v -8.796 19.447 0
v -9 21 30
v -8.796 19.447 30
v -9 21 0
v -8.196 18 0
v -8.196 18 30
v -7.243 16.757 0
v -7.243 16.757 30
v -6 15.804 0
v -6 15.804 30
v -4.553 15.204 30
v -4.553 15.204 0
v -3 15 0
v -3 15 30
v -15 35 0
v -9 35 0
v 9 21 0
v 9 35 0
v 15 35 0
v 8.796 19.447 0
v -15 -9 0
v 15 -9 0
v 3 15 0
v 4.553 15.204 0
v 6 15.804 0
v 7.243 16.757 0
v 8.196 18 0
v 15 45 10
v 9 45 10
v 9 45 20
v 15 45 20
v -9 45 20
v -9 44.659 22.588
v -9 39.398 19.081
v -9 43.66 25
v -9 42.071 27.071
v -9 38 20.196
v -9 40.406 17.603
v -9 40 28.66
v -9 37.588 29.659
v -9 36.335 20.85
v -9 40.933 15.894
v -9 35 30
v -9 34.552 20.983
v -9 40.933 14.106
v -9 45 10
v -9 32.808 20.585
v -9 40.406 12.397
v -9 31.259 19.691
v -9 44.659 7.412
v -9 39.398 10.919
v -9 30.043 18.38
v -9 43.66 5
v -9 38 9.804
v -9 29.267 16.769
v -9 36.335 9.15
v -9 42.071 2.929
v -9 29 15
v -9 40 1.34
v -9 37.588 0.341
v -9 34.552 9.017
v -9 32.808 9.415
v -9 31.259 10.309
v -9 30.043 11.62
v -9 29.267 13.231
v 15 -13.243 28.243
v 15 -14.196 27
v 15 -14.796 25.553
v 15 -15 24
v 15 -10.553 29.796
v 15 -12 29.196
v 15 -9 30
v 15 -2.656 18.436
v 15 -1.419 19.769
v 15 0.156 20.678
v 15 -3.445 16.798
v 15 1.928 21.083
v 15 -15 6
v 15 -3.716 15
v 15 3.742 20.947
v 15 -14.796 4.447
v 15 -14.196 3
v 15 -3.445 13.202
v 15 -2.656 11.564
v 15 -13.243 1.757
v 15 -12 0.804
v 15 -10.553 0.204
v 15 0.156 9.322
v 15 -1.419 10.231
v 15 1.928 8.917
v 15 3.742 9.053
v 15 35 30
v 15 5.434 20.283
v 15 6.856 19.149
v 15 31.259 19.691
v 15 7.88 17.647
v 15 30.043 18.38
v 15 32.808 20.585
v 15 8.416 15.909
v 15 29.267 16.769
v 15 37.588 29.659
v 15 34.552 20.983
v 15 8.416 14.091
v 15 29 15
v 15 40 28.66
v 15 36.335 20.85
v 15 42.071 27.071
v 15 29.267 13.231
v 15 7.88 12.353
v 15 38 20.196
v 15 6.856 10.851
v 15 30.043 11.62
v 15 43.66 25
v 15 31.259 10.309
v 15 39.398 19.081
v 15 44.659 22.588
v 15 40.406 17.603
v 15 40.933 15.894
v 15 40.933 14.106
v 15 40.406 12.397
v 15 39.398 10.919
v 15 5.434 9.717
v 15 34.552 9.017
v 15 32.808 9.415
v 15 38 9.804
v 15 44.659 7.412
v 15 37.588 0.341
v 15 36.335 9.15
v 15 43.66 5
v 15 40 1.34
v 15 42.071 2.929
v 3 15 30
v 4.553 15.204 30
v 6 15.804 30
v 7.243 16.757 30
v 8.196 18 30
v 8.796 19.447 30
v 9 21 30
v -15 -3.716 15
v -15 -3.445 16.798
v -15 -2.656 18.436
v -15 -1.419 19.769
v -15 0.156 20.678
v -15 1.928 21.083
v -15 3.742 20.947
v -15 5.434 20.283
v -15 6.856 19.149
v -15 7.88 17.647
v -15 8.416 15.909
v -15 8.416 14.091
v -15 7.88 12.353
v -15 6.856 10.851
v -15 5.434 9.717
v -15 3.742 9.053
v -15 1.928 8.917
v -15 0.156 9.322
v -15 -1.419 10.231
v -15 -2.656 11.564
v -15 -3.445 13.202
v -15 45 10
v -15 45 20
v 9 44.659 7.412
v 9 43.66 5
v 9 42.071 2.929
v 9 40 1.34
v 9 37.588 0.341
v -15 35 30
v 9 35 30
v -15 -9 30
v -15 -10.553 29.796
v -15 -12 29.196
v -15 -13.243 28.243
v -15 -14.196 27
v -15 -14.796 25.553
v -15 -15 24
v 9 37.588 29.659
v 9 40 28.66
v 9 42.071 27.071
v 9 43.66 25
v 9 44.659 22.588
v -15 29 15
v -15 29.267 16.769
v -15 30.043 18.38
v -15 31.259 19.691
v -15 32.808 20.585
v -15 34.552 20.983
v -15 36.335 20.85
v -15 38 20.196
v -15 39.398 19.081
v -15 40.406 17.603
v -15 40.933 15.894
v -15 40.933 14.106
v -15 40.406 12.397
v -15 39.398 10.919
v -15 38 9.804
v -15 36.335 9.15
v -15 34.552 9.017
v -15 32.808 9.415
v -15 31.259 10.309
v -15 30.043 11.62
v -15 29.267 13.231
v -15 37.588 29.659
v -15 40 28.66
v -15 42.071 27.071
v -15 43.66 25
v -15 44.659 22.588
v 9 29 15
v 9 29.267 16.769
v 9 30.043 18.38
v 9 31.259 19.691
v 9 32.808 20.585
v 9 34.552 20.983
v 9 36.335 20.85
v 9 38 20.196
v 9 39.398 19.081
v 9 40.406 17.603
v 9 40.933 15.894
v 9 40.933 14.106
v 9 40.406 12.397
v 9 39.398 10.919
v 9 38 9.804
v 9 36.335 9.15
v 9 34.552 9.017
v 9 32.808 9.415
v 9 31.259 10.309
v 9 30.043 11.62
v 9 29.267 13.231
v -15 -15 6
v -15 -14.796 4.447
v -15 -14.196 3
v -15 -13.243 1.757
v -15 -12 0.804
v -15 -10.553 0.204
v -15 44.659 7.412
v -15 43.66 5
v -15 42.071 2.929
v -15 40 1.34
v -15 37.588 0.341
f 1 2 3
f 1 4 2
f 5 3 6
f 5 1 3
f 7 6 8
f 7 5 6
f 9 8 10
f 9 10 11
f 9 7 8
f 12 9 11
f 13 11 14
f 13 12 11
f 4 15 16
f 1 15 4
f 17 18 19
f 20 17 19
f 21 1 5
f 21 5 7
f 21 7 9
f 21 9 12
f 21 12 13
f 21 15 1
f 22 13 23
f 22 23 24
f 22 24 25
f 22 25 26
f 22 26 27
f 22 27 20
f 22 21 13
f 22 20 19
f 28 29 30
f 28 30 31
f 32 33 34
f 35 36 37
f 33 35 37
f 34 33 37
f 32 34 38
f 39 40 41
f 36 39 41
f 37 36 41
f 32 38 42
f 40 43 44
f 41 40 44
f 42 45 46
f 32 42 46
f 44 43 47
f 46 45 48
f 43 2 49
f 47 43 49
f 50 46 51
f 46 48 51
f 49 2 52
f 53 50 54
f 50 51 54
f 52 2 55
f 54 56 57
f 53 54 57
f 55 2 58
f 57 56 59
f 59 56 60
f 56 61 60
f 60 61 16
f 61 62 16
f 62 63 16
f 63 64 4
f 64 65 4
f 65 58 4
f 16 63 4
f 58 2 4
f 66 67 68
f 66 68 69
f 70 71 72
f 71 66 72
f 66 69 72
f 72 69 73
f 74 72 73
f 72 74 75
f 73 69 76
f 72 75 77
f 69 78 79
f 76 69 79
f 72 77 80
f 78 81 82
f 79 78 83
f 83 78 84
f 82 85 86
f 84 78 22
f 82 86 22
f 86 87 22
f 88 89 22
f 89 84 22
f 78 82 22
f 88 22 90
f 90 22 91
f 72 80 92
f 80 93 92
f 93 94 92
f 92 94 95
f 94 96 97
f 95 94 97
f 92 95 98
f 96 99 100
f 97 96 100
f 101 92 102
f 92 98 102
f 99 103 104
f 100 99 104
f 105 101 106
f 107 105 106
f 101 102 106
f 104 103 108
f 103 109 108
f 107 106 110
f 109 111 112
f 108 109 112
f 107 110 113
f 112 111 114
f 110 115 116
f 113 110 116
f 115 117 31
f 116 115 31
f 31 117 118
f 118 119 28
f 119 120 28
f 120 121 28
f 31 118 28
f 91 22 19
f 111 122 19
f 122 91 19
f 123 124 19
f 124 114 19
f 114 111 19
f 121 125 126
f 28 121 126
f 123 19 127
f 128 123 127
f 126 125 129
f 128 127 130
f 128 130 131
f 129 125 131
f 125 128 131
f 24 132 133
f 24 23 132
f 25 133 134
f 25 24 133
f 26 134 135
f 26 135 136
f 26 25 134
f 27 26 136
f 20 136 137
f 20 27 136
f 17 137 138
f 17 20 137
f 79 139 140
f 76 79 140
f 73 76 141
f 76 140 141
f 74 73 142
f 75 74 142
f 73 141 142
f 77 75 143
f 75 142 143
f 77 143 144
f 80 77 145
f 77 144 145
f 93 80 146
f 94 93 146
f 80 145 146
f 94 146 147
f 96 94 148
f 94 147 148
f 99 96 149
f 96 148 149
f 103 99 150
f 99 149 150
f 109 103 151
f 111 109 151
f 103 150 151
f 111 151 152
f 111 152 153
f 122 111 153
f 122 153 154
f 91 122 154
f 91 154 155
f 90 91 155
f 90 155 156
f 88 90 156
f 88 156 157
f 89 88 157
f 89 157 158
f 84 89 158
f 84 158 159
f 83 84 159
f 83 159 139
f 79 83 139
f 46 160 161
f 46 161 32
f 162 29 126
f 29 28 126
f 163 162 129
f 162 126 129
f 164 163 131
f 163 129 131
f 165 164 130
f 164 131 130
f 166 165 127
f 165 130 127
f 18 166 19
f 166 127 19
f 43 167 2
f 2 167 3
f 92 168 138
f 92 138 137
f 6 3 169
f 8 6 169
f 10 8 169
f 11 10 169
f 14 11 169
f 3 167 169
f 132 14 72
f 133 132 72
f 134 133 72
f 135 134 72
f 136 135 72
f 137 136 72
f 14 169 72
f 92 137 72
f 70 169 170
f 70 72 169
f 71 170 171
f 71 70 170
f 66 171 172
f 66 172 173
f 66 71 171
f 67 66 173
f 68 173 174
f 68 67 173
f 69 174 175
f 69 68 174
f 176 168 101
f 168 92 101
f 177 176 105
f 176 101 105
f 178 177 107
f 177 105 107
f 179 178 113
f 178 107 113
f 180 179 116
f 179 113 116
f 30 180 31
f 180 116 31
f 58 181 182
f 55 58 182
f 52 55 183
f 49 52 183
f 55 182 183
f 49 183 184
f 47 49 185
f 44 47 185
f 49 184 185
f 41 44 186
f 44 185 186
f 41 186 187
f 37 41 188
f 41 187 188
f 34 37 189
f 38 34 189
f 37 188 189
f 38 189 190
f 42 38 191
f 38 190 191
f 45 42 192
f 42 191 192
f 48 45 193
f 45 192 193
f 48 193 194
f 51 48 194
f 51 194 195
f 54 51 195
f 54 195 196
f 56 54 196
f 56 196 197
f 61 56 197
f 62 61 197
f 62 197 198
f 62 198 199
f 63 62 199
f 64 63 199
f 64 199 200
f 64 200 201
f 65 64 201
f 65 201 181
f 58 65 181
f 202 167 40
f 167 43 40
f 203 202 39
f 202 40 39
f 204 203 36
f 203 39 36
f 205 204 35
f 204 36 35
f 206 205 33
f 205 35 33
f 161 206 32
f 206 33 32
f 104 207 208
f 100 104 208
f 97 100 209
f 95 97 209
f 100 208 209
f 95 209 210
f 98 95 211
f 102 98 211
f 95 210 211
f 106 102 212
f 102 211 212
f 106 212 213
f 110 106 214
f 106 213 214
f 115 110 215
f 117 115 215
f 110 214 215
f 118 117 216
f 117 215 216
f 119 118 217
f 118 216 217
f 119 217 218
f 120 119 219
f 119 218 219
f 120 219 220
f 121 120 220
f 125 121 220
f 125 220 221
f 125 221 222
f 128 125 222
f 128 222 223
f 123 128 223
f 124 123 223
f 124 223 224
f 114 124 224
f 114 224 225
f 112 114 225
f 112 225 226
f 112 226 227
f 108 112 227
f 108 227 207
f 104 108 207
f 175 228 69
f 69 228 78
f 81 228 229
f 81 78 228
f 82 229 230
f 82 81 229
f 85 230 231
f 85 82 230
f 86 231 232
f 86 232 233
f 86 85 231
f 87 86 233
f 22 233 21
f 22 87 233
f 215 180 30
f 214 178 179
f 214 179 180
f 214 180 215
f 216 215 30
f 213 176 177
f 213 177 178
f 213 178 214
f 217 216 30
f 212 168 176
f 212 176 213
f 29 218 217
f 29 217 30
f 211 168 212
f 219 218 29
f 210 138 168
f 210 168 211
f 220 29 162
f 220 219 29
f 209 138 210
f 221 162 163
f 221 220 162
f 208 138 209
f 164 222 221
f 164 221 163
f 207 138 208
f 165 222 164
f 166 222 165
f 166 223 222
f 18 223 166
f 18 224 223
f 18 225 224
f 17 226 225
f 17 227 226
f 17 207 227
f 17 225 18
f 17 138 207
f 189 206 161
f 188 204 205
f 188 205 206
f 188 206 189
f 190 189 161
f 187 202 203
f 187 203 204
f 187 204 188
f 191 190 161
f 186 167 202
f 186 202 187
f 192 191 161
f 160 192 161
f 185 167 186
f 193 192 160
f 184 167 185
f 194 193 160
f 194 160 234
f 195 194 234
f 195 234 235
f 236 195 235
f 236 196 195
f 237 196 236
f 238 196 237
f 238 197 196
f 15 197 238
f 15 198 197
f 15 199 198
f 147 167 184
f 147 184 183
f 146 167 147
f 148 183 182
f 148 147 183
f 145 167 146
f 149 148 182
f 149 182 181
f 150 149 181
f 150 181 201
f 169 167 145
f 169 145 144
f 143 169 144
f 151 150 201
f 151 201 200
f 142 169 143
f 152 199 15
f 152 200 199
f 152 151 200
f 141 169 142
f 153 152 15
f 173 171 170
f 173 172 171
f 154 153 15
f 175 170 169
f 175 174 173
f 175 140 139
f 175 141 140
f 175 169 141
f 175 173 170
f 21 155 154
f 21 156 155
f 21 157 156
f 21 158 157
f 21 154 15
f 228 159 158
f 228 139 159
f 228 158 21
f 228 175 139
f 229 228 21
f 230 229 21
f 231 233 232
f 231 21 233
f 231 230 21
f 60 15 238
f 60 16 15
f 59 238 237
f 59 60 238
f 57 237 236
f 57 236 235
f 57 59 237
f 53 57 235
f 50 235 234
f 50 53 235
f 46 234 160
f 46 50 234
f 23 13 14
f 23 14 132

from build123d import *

# Parameters (mm, degrees)
SKETCH2_W           = 30
SKETCH2_H           = 30
BOSS_EXTRUDE2_DEPTH = 30
SKETCH4_W           = 6
SKETCH4_H           = 30
BOSS_EXTRUDE3_DEPTH = 30
FILLET4_R           = 10
SKETCH5_R           = 6
CUT_EXTRUDE1_DEPTH  = 30
FILLET5_R           = 6
SKETCH6_R           = 6.1
CUT_EXTRUDE2_DEPTH  = 62
FILLET6_R           = 6


with BuildPart() as part:
    # Sketch2 → Boss-Extrude2 (new body)
    with BuildSketch(Plane.XY):
        Rectangle(SKETCH2_W, SKETCH2_H)
    extrude(amount=BOSS_EXTRUDE2_DEPTH)

    # Sketch4 → Boss-Extrude3 (add)
    with BuildSketch(Plane(origin=(0, 15, 0), x_dir=(1, 0, 0), z_dir=(0, 1, 0))):
        with Locations((-12, -15)):
            Rectangle(SKETCH4_W, SKETCH4_H)
        with Locations((12, -15)):
            Rectangle(SKETCH4_W, SKETCH4_H)
    extrude(amount=BOSS_EXTRUDE3_DEPTH)

    # Fillet4
    fillet4_edges = [part.edges().sort_by_distance(p)[0] for p in [
        (-12, 45, 30),
        (-12, 45, 0),
        (12, 45, 30),
        (12, 45, 0),
    ]]
    fillet(fillet4_edges, radius=FILLET4_R)

    # Sketch5 → Cut-Extrude1 (cut)
    with BuildSketch(Plane.ZY.offset(15)):
        with Locations(Location((15, 35, 0), (0, 0, 270))):
            Circle(SKETCH5_R)
    extrude(amount=-CUT_EXTRUDE1_DEPTH, mode=Mode.SUBTRACT)

    # Fillet5
    fillet5_edges = [part.edges().sort_by_distance(p)[0] for p in [
        (-9, 15, 15),
        (9, 15, 15),
    ]]
    fillet(fillet5_edges, radius=FILLET5_R)

    # Sketch6 → Cut-Extrude2 (cut)
    with BuildSketch(Plane.ZY.offset(15)):
        with Locations(Location((15, 2.384259025, 0), (0, 0, 270))):
            Circle(SKETCH6_R)
    extrude(amount=-CUT_EXTRUDE2_DEPTH, mode=Mode.SUBTRACT)

    # Fillet6
    fillet6_edges = [part.edges().sort_by_distance(p)[0] for p in [
        (0, -15, 30),
        (0, -15, 0),
    ]]
    fillet(fillet6_edges, radius=FILLET6_R)


solid = part.part
